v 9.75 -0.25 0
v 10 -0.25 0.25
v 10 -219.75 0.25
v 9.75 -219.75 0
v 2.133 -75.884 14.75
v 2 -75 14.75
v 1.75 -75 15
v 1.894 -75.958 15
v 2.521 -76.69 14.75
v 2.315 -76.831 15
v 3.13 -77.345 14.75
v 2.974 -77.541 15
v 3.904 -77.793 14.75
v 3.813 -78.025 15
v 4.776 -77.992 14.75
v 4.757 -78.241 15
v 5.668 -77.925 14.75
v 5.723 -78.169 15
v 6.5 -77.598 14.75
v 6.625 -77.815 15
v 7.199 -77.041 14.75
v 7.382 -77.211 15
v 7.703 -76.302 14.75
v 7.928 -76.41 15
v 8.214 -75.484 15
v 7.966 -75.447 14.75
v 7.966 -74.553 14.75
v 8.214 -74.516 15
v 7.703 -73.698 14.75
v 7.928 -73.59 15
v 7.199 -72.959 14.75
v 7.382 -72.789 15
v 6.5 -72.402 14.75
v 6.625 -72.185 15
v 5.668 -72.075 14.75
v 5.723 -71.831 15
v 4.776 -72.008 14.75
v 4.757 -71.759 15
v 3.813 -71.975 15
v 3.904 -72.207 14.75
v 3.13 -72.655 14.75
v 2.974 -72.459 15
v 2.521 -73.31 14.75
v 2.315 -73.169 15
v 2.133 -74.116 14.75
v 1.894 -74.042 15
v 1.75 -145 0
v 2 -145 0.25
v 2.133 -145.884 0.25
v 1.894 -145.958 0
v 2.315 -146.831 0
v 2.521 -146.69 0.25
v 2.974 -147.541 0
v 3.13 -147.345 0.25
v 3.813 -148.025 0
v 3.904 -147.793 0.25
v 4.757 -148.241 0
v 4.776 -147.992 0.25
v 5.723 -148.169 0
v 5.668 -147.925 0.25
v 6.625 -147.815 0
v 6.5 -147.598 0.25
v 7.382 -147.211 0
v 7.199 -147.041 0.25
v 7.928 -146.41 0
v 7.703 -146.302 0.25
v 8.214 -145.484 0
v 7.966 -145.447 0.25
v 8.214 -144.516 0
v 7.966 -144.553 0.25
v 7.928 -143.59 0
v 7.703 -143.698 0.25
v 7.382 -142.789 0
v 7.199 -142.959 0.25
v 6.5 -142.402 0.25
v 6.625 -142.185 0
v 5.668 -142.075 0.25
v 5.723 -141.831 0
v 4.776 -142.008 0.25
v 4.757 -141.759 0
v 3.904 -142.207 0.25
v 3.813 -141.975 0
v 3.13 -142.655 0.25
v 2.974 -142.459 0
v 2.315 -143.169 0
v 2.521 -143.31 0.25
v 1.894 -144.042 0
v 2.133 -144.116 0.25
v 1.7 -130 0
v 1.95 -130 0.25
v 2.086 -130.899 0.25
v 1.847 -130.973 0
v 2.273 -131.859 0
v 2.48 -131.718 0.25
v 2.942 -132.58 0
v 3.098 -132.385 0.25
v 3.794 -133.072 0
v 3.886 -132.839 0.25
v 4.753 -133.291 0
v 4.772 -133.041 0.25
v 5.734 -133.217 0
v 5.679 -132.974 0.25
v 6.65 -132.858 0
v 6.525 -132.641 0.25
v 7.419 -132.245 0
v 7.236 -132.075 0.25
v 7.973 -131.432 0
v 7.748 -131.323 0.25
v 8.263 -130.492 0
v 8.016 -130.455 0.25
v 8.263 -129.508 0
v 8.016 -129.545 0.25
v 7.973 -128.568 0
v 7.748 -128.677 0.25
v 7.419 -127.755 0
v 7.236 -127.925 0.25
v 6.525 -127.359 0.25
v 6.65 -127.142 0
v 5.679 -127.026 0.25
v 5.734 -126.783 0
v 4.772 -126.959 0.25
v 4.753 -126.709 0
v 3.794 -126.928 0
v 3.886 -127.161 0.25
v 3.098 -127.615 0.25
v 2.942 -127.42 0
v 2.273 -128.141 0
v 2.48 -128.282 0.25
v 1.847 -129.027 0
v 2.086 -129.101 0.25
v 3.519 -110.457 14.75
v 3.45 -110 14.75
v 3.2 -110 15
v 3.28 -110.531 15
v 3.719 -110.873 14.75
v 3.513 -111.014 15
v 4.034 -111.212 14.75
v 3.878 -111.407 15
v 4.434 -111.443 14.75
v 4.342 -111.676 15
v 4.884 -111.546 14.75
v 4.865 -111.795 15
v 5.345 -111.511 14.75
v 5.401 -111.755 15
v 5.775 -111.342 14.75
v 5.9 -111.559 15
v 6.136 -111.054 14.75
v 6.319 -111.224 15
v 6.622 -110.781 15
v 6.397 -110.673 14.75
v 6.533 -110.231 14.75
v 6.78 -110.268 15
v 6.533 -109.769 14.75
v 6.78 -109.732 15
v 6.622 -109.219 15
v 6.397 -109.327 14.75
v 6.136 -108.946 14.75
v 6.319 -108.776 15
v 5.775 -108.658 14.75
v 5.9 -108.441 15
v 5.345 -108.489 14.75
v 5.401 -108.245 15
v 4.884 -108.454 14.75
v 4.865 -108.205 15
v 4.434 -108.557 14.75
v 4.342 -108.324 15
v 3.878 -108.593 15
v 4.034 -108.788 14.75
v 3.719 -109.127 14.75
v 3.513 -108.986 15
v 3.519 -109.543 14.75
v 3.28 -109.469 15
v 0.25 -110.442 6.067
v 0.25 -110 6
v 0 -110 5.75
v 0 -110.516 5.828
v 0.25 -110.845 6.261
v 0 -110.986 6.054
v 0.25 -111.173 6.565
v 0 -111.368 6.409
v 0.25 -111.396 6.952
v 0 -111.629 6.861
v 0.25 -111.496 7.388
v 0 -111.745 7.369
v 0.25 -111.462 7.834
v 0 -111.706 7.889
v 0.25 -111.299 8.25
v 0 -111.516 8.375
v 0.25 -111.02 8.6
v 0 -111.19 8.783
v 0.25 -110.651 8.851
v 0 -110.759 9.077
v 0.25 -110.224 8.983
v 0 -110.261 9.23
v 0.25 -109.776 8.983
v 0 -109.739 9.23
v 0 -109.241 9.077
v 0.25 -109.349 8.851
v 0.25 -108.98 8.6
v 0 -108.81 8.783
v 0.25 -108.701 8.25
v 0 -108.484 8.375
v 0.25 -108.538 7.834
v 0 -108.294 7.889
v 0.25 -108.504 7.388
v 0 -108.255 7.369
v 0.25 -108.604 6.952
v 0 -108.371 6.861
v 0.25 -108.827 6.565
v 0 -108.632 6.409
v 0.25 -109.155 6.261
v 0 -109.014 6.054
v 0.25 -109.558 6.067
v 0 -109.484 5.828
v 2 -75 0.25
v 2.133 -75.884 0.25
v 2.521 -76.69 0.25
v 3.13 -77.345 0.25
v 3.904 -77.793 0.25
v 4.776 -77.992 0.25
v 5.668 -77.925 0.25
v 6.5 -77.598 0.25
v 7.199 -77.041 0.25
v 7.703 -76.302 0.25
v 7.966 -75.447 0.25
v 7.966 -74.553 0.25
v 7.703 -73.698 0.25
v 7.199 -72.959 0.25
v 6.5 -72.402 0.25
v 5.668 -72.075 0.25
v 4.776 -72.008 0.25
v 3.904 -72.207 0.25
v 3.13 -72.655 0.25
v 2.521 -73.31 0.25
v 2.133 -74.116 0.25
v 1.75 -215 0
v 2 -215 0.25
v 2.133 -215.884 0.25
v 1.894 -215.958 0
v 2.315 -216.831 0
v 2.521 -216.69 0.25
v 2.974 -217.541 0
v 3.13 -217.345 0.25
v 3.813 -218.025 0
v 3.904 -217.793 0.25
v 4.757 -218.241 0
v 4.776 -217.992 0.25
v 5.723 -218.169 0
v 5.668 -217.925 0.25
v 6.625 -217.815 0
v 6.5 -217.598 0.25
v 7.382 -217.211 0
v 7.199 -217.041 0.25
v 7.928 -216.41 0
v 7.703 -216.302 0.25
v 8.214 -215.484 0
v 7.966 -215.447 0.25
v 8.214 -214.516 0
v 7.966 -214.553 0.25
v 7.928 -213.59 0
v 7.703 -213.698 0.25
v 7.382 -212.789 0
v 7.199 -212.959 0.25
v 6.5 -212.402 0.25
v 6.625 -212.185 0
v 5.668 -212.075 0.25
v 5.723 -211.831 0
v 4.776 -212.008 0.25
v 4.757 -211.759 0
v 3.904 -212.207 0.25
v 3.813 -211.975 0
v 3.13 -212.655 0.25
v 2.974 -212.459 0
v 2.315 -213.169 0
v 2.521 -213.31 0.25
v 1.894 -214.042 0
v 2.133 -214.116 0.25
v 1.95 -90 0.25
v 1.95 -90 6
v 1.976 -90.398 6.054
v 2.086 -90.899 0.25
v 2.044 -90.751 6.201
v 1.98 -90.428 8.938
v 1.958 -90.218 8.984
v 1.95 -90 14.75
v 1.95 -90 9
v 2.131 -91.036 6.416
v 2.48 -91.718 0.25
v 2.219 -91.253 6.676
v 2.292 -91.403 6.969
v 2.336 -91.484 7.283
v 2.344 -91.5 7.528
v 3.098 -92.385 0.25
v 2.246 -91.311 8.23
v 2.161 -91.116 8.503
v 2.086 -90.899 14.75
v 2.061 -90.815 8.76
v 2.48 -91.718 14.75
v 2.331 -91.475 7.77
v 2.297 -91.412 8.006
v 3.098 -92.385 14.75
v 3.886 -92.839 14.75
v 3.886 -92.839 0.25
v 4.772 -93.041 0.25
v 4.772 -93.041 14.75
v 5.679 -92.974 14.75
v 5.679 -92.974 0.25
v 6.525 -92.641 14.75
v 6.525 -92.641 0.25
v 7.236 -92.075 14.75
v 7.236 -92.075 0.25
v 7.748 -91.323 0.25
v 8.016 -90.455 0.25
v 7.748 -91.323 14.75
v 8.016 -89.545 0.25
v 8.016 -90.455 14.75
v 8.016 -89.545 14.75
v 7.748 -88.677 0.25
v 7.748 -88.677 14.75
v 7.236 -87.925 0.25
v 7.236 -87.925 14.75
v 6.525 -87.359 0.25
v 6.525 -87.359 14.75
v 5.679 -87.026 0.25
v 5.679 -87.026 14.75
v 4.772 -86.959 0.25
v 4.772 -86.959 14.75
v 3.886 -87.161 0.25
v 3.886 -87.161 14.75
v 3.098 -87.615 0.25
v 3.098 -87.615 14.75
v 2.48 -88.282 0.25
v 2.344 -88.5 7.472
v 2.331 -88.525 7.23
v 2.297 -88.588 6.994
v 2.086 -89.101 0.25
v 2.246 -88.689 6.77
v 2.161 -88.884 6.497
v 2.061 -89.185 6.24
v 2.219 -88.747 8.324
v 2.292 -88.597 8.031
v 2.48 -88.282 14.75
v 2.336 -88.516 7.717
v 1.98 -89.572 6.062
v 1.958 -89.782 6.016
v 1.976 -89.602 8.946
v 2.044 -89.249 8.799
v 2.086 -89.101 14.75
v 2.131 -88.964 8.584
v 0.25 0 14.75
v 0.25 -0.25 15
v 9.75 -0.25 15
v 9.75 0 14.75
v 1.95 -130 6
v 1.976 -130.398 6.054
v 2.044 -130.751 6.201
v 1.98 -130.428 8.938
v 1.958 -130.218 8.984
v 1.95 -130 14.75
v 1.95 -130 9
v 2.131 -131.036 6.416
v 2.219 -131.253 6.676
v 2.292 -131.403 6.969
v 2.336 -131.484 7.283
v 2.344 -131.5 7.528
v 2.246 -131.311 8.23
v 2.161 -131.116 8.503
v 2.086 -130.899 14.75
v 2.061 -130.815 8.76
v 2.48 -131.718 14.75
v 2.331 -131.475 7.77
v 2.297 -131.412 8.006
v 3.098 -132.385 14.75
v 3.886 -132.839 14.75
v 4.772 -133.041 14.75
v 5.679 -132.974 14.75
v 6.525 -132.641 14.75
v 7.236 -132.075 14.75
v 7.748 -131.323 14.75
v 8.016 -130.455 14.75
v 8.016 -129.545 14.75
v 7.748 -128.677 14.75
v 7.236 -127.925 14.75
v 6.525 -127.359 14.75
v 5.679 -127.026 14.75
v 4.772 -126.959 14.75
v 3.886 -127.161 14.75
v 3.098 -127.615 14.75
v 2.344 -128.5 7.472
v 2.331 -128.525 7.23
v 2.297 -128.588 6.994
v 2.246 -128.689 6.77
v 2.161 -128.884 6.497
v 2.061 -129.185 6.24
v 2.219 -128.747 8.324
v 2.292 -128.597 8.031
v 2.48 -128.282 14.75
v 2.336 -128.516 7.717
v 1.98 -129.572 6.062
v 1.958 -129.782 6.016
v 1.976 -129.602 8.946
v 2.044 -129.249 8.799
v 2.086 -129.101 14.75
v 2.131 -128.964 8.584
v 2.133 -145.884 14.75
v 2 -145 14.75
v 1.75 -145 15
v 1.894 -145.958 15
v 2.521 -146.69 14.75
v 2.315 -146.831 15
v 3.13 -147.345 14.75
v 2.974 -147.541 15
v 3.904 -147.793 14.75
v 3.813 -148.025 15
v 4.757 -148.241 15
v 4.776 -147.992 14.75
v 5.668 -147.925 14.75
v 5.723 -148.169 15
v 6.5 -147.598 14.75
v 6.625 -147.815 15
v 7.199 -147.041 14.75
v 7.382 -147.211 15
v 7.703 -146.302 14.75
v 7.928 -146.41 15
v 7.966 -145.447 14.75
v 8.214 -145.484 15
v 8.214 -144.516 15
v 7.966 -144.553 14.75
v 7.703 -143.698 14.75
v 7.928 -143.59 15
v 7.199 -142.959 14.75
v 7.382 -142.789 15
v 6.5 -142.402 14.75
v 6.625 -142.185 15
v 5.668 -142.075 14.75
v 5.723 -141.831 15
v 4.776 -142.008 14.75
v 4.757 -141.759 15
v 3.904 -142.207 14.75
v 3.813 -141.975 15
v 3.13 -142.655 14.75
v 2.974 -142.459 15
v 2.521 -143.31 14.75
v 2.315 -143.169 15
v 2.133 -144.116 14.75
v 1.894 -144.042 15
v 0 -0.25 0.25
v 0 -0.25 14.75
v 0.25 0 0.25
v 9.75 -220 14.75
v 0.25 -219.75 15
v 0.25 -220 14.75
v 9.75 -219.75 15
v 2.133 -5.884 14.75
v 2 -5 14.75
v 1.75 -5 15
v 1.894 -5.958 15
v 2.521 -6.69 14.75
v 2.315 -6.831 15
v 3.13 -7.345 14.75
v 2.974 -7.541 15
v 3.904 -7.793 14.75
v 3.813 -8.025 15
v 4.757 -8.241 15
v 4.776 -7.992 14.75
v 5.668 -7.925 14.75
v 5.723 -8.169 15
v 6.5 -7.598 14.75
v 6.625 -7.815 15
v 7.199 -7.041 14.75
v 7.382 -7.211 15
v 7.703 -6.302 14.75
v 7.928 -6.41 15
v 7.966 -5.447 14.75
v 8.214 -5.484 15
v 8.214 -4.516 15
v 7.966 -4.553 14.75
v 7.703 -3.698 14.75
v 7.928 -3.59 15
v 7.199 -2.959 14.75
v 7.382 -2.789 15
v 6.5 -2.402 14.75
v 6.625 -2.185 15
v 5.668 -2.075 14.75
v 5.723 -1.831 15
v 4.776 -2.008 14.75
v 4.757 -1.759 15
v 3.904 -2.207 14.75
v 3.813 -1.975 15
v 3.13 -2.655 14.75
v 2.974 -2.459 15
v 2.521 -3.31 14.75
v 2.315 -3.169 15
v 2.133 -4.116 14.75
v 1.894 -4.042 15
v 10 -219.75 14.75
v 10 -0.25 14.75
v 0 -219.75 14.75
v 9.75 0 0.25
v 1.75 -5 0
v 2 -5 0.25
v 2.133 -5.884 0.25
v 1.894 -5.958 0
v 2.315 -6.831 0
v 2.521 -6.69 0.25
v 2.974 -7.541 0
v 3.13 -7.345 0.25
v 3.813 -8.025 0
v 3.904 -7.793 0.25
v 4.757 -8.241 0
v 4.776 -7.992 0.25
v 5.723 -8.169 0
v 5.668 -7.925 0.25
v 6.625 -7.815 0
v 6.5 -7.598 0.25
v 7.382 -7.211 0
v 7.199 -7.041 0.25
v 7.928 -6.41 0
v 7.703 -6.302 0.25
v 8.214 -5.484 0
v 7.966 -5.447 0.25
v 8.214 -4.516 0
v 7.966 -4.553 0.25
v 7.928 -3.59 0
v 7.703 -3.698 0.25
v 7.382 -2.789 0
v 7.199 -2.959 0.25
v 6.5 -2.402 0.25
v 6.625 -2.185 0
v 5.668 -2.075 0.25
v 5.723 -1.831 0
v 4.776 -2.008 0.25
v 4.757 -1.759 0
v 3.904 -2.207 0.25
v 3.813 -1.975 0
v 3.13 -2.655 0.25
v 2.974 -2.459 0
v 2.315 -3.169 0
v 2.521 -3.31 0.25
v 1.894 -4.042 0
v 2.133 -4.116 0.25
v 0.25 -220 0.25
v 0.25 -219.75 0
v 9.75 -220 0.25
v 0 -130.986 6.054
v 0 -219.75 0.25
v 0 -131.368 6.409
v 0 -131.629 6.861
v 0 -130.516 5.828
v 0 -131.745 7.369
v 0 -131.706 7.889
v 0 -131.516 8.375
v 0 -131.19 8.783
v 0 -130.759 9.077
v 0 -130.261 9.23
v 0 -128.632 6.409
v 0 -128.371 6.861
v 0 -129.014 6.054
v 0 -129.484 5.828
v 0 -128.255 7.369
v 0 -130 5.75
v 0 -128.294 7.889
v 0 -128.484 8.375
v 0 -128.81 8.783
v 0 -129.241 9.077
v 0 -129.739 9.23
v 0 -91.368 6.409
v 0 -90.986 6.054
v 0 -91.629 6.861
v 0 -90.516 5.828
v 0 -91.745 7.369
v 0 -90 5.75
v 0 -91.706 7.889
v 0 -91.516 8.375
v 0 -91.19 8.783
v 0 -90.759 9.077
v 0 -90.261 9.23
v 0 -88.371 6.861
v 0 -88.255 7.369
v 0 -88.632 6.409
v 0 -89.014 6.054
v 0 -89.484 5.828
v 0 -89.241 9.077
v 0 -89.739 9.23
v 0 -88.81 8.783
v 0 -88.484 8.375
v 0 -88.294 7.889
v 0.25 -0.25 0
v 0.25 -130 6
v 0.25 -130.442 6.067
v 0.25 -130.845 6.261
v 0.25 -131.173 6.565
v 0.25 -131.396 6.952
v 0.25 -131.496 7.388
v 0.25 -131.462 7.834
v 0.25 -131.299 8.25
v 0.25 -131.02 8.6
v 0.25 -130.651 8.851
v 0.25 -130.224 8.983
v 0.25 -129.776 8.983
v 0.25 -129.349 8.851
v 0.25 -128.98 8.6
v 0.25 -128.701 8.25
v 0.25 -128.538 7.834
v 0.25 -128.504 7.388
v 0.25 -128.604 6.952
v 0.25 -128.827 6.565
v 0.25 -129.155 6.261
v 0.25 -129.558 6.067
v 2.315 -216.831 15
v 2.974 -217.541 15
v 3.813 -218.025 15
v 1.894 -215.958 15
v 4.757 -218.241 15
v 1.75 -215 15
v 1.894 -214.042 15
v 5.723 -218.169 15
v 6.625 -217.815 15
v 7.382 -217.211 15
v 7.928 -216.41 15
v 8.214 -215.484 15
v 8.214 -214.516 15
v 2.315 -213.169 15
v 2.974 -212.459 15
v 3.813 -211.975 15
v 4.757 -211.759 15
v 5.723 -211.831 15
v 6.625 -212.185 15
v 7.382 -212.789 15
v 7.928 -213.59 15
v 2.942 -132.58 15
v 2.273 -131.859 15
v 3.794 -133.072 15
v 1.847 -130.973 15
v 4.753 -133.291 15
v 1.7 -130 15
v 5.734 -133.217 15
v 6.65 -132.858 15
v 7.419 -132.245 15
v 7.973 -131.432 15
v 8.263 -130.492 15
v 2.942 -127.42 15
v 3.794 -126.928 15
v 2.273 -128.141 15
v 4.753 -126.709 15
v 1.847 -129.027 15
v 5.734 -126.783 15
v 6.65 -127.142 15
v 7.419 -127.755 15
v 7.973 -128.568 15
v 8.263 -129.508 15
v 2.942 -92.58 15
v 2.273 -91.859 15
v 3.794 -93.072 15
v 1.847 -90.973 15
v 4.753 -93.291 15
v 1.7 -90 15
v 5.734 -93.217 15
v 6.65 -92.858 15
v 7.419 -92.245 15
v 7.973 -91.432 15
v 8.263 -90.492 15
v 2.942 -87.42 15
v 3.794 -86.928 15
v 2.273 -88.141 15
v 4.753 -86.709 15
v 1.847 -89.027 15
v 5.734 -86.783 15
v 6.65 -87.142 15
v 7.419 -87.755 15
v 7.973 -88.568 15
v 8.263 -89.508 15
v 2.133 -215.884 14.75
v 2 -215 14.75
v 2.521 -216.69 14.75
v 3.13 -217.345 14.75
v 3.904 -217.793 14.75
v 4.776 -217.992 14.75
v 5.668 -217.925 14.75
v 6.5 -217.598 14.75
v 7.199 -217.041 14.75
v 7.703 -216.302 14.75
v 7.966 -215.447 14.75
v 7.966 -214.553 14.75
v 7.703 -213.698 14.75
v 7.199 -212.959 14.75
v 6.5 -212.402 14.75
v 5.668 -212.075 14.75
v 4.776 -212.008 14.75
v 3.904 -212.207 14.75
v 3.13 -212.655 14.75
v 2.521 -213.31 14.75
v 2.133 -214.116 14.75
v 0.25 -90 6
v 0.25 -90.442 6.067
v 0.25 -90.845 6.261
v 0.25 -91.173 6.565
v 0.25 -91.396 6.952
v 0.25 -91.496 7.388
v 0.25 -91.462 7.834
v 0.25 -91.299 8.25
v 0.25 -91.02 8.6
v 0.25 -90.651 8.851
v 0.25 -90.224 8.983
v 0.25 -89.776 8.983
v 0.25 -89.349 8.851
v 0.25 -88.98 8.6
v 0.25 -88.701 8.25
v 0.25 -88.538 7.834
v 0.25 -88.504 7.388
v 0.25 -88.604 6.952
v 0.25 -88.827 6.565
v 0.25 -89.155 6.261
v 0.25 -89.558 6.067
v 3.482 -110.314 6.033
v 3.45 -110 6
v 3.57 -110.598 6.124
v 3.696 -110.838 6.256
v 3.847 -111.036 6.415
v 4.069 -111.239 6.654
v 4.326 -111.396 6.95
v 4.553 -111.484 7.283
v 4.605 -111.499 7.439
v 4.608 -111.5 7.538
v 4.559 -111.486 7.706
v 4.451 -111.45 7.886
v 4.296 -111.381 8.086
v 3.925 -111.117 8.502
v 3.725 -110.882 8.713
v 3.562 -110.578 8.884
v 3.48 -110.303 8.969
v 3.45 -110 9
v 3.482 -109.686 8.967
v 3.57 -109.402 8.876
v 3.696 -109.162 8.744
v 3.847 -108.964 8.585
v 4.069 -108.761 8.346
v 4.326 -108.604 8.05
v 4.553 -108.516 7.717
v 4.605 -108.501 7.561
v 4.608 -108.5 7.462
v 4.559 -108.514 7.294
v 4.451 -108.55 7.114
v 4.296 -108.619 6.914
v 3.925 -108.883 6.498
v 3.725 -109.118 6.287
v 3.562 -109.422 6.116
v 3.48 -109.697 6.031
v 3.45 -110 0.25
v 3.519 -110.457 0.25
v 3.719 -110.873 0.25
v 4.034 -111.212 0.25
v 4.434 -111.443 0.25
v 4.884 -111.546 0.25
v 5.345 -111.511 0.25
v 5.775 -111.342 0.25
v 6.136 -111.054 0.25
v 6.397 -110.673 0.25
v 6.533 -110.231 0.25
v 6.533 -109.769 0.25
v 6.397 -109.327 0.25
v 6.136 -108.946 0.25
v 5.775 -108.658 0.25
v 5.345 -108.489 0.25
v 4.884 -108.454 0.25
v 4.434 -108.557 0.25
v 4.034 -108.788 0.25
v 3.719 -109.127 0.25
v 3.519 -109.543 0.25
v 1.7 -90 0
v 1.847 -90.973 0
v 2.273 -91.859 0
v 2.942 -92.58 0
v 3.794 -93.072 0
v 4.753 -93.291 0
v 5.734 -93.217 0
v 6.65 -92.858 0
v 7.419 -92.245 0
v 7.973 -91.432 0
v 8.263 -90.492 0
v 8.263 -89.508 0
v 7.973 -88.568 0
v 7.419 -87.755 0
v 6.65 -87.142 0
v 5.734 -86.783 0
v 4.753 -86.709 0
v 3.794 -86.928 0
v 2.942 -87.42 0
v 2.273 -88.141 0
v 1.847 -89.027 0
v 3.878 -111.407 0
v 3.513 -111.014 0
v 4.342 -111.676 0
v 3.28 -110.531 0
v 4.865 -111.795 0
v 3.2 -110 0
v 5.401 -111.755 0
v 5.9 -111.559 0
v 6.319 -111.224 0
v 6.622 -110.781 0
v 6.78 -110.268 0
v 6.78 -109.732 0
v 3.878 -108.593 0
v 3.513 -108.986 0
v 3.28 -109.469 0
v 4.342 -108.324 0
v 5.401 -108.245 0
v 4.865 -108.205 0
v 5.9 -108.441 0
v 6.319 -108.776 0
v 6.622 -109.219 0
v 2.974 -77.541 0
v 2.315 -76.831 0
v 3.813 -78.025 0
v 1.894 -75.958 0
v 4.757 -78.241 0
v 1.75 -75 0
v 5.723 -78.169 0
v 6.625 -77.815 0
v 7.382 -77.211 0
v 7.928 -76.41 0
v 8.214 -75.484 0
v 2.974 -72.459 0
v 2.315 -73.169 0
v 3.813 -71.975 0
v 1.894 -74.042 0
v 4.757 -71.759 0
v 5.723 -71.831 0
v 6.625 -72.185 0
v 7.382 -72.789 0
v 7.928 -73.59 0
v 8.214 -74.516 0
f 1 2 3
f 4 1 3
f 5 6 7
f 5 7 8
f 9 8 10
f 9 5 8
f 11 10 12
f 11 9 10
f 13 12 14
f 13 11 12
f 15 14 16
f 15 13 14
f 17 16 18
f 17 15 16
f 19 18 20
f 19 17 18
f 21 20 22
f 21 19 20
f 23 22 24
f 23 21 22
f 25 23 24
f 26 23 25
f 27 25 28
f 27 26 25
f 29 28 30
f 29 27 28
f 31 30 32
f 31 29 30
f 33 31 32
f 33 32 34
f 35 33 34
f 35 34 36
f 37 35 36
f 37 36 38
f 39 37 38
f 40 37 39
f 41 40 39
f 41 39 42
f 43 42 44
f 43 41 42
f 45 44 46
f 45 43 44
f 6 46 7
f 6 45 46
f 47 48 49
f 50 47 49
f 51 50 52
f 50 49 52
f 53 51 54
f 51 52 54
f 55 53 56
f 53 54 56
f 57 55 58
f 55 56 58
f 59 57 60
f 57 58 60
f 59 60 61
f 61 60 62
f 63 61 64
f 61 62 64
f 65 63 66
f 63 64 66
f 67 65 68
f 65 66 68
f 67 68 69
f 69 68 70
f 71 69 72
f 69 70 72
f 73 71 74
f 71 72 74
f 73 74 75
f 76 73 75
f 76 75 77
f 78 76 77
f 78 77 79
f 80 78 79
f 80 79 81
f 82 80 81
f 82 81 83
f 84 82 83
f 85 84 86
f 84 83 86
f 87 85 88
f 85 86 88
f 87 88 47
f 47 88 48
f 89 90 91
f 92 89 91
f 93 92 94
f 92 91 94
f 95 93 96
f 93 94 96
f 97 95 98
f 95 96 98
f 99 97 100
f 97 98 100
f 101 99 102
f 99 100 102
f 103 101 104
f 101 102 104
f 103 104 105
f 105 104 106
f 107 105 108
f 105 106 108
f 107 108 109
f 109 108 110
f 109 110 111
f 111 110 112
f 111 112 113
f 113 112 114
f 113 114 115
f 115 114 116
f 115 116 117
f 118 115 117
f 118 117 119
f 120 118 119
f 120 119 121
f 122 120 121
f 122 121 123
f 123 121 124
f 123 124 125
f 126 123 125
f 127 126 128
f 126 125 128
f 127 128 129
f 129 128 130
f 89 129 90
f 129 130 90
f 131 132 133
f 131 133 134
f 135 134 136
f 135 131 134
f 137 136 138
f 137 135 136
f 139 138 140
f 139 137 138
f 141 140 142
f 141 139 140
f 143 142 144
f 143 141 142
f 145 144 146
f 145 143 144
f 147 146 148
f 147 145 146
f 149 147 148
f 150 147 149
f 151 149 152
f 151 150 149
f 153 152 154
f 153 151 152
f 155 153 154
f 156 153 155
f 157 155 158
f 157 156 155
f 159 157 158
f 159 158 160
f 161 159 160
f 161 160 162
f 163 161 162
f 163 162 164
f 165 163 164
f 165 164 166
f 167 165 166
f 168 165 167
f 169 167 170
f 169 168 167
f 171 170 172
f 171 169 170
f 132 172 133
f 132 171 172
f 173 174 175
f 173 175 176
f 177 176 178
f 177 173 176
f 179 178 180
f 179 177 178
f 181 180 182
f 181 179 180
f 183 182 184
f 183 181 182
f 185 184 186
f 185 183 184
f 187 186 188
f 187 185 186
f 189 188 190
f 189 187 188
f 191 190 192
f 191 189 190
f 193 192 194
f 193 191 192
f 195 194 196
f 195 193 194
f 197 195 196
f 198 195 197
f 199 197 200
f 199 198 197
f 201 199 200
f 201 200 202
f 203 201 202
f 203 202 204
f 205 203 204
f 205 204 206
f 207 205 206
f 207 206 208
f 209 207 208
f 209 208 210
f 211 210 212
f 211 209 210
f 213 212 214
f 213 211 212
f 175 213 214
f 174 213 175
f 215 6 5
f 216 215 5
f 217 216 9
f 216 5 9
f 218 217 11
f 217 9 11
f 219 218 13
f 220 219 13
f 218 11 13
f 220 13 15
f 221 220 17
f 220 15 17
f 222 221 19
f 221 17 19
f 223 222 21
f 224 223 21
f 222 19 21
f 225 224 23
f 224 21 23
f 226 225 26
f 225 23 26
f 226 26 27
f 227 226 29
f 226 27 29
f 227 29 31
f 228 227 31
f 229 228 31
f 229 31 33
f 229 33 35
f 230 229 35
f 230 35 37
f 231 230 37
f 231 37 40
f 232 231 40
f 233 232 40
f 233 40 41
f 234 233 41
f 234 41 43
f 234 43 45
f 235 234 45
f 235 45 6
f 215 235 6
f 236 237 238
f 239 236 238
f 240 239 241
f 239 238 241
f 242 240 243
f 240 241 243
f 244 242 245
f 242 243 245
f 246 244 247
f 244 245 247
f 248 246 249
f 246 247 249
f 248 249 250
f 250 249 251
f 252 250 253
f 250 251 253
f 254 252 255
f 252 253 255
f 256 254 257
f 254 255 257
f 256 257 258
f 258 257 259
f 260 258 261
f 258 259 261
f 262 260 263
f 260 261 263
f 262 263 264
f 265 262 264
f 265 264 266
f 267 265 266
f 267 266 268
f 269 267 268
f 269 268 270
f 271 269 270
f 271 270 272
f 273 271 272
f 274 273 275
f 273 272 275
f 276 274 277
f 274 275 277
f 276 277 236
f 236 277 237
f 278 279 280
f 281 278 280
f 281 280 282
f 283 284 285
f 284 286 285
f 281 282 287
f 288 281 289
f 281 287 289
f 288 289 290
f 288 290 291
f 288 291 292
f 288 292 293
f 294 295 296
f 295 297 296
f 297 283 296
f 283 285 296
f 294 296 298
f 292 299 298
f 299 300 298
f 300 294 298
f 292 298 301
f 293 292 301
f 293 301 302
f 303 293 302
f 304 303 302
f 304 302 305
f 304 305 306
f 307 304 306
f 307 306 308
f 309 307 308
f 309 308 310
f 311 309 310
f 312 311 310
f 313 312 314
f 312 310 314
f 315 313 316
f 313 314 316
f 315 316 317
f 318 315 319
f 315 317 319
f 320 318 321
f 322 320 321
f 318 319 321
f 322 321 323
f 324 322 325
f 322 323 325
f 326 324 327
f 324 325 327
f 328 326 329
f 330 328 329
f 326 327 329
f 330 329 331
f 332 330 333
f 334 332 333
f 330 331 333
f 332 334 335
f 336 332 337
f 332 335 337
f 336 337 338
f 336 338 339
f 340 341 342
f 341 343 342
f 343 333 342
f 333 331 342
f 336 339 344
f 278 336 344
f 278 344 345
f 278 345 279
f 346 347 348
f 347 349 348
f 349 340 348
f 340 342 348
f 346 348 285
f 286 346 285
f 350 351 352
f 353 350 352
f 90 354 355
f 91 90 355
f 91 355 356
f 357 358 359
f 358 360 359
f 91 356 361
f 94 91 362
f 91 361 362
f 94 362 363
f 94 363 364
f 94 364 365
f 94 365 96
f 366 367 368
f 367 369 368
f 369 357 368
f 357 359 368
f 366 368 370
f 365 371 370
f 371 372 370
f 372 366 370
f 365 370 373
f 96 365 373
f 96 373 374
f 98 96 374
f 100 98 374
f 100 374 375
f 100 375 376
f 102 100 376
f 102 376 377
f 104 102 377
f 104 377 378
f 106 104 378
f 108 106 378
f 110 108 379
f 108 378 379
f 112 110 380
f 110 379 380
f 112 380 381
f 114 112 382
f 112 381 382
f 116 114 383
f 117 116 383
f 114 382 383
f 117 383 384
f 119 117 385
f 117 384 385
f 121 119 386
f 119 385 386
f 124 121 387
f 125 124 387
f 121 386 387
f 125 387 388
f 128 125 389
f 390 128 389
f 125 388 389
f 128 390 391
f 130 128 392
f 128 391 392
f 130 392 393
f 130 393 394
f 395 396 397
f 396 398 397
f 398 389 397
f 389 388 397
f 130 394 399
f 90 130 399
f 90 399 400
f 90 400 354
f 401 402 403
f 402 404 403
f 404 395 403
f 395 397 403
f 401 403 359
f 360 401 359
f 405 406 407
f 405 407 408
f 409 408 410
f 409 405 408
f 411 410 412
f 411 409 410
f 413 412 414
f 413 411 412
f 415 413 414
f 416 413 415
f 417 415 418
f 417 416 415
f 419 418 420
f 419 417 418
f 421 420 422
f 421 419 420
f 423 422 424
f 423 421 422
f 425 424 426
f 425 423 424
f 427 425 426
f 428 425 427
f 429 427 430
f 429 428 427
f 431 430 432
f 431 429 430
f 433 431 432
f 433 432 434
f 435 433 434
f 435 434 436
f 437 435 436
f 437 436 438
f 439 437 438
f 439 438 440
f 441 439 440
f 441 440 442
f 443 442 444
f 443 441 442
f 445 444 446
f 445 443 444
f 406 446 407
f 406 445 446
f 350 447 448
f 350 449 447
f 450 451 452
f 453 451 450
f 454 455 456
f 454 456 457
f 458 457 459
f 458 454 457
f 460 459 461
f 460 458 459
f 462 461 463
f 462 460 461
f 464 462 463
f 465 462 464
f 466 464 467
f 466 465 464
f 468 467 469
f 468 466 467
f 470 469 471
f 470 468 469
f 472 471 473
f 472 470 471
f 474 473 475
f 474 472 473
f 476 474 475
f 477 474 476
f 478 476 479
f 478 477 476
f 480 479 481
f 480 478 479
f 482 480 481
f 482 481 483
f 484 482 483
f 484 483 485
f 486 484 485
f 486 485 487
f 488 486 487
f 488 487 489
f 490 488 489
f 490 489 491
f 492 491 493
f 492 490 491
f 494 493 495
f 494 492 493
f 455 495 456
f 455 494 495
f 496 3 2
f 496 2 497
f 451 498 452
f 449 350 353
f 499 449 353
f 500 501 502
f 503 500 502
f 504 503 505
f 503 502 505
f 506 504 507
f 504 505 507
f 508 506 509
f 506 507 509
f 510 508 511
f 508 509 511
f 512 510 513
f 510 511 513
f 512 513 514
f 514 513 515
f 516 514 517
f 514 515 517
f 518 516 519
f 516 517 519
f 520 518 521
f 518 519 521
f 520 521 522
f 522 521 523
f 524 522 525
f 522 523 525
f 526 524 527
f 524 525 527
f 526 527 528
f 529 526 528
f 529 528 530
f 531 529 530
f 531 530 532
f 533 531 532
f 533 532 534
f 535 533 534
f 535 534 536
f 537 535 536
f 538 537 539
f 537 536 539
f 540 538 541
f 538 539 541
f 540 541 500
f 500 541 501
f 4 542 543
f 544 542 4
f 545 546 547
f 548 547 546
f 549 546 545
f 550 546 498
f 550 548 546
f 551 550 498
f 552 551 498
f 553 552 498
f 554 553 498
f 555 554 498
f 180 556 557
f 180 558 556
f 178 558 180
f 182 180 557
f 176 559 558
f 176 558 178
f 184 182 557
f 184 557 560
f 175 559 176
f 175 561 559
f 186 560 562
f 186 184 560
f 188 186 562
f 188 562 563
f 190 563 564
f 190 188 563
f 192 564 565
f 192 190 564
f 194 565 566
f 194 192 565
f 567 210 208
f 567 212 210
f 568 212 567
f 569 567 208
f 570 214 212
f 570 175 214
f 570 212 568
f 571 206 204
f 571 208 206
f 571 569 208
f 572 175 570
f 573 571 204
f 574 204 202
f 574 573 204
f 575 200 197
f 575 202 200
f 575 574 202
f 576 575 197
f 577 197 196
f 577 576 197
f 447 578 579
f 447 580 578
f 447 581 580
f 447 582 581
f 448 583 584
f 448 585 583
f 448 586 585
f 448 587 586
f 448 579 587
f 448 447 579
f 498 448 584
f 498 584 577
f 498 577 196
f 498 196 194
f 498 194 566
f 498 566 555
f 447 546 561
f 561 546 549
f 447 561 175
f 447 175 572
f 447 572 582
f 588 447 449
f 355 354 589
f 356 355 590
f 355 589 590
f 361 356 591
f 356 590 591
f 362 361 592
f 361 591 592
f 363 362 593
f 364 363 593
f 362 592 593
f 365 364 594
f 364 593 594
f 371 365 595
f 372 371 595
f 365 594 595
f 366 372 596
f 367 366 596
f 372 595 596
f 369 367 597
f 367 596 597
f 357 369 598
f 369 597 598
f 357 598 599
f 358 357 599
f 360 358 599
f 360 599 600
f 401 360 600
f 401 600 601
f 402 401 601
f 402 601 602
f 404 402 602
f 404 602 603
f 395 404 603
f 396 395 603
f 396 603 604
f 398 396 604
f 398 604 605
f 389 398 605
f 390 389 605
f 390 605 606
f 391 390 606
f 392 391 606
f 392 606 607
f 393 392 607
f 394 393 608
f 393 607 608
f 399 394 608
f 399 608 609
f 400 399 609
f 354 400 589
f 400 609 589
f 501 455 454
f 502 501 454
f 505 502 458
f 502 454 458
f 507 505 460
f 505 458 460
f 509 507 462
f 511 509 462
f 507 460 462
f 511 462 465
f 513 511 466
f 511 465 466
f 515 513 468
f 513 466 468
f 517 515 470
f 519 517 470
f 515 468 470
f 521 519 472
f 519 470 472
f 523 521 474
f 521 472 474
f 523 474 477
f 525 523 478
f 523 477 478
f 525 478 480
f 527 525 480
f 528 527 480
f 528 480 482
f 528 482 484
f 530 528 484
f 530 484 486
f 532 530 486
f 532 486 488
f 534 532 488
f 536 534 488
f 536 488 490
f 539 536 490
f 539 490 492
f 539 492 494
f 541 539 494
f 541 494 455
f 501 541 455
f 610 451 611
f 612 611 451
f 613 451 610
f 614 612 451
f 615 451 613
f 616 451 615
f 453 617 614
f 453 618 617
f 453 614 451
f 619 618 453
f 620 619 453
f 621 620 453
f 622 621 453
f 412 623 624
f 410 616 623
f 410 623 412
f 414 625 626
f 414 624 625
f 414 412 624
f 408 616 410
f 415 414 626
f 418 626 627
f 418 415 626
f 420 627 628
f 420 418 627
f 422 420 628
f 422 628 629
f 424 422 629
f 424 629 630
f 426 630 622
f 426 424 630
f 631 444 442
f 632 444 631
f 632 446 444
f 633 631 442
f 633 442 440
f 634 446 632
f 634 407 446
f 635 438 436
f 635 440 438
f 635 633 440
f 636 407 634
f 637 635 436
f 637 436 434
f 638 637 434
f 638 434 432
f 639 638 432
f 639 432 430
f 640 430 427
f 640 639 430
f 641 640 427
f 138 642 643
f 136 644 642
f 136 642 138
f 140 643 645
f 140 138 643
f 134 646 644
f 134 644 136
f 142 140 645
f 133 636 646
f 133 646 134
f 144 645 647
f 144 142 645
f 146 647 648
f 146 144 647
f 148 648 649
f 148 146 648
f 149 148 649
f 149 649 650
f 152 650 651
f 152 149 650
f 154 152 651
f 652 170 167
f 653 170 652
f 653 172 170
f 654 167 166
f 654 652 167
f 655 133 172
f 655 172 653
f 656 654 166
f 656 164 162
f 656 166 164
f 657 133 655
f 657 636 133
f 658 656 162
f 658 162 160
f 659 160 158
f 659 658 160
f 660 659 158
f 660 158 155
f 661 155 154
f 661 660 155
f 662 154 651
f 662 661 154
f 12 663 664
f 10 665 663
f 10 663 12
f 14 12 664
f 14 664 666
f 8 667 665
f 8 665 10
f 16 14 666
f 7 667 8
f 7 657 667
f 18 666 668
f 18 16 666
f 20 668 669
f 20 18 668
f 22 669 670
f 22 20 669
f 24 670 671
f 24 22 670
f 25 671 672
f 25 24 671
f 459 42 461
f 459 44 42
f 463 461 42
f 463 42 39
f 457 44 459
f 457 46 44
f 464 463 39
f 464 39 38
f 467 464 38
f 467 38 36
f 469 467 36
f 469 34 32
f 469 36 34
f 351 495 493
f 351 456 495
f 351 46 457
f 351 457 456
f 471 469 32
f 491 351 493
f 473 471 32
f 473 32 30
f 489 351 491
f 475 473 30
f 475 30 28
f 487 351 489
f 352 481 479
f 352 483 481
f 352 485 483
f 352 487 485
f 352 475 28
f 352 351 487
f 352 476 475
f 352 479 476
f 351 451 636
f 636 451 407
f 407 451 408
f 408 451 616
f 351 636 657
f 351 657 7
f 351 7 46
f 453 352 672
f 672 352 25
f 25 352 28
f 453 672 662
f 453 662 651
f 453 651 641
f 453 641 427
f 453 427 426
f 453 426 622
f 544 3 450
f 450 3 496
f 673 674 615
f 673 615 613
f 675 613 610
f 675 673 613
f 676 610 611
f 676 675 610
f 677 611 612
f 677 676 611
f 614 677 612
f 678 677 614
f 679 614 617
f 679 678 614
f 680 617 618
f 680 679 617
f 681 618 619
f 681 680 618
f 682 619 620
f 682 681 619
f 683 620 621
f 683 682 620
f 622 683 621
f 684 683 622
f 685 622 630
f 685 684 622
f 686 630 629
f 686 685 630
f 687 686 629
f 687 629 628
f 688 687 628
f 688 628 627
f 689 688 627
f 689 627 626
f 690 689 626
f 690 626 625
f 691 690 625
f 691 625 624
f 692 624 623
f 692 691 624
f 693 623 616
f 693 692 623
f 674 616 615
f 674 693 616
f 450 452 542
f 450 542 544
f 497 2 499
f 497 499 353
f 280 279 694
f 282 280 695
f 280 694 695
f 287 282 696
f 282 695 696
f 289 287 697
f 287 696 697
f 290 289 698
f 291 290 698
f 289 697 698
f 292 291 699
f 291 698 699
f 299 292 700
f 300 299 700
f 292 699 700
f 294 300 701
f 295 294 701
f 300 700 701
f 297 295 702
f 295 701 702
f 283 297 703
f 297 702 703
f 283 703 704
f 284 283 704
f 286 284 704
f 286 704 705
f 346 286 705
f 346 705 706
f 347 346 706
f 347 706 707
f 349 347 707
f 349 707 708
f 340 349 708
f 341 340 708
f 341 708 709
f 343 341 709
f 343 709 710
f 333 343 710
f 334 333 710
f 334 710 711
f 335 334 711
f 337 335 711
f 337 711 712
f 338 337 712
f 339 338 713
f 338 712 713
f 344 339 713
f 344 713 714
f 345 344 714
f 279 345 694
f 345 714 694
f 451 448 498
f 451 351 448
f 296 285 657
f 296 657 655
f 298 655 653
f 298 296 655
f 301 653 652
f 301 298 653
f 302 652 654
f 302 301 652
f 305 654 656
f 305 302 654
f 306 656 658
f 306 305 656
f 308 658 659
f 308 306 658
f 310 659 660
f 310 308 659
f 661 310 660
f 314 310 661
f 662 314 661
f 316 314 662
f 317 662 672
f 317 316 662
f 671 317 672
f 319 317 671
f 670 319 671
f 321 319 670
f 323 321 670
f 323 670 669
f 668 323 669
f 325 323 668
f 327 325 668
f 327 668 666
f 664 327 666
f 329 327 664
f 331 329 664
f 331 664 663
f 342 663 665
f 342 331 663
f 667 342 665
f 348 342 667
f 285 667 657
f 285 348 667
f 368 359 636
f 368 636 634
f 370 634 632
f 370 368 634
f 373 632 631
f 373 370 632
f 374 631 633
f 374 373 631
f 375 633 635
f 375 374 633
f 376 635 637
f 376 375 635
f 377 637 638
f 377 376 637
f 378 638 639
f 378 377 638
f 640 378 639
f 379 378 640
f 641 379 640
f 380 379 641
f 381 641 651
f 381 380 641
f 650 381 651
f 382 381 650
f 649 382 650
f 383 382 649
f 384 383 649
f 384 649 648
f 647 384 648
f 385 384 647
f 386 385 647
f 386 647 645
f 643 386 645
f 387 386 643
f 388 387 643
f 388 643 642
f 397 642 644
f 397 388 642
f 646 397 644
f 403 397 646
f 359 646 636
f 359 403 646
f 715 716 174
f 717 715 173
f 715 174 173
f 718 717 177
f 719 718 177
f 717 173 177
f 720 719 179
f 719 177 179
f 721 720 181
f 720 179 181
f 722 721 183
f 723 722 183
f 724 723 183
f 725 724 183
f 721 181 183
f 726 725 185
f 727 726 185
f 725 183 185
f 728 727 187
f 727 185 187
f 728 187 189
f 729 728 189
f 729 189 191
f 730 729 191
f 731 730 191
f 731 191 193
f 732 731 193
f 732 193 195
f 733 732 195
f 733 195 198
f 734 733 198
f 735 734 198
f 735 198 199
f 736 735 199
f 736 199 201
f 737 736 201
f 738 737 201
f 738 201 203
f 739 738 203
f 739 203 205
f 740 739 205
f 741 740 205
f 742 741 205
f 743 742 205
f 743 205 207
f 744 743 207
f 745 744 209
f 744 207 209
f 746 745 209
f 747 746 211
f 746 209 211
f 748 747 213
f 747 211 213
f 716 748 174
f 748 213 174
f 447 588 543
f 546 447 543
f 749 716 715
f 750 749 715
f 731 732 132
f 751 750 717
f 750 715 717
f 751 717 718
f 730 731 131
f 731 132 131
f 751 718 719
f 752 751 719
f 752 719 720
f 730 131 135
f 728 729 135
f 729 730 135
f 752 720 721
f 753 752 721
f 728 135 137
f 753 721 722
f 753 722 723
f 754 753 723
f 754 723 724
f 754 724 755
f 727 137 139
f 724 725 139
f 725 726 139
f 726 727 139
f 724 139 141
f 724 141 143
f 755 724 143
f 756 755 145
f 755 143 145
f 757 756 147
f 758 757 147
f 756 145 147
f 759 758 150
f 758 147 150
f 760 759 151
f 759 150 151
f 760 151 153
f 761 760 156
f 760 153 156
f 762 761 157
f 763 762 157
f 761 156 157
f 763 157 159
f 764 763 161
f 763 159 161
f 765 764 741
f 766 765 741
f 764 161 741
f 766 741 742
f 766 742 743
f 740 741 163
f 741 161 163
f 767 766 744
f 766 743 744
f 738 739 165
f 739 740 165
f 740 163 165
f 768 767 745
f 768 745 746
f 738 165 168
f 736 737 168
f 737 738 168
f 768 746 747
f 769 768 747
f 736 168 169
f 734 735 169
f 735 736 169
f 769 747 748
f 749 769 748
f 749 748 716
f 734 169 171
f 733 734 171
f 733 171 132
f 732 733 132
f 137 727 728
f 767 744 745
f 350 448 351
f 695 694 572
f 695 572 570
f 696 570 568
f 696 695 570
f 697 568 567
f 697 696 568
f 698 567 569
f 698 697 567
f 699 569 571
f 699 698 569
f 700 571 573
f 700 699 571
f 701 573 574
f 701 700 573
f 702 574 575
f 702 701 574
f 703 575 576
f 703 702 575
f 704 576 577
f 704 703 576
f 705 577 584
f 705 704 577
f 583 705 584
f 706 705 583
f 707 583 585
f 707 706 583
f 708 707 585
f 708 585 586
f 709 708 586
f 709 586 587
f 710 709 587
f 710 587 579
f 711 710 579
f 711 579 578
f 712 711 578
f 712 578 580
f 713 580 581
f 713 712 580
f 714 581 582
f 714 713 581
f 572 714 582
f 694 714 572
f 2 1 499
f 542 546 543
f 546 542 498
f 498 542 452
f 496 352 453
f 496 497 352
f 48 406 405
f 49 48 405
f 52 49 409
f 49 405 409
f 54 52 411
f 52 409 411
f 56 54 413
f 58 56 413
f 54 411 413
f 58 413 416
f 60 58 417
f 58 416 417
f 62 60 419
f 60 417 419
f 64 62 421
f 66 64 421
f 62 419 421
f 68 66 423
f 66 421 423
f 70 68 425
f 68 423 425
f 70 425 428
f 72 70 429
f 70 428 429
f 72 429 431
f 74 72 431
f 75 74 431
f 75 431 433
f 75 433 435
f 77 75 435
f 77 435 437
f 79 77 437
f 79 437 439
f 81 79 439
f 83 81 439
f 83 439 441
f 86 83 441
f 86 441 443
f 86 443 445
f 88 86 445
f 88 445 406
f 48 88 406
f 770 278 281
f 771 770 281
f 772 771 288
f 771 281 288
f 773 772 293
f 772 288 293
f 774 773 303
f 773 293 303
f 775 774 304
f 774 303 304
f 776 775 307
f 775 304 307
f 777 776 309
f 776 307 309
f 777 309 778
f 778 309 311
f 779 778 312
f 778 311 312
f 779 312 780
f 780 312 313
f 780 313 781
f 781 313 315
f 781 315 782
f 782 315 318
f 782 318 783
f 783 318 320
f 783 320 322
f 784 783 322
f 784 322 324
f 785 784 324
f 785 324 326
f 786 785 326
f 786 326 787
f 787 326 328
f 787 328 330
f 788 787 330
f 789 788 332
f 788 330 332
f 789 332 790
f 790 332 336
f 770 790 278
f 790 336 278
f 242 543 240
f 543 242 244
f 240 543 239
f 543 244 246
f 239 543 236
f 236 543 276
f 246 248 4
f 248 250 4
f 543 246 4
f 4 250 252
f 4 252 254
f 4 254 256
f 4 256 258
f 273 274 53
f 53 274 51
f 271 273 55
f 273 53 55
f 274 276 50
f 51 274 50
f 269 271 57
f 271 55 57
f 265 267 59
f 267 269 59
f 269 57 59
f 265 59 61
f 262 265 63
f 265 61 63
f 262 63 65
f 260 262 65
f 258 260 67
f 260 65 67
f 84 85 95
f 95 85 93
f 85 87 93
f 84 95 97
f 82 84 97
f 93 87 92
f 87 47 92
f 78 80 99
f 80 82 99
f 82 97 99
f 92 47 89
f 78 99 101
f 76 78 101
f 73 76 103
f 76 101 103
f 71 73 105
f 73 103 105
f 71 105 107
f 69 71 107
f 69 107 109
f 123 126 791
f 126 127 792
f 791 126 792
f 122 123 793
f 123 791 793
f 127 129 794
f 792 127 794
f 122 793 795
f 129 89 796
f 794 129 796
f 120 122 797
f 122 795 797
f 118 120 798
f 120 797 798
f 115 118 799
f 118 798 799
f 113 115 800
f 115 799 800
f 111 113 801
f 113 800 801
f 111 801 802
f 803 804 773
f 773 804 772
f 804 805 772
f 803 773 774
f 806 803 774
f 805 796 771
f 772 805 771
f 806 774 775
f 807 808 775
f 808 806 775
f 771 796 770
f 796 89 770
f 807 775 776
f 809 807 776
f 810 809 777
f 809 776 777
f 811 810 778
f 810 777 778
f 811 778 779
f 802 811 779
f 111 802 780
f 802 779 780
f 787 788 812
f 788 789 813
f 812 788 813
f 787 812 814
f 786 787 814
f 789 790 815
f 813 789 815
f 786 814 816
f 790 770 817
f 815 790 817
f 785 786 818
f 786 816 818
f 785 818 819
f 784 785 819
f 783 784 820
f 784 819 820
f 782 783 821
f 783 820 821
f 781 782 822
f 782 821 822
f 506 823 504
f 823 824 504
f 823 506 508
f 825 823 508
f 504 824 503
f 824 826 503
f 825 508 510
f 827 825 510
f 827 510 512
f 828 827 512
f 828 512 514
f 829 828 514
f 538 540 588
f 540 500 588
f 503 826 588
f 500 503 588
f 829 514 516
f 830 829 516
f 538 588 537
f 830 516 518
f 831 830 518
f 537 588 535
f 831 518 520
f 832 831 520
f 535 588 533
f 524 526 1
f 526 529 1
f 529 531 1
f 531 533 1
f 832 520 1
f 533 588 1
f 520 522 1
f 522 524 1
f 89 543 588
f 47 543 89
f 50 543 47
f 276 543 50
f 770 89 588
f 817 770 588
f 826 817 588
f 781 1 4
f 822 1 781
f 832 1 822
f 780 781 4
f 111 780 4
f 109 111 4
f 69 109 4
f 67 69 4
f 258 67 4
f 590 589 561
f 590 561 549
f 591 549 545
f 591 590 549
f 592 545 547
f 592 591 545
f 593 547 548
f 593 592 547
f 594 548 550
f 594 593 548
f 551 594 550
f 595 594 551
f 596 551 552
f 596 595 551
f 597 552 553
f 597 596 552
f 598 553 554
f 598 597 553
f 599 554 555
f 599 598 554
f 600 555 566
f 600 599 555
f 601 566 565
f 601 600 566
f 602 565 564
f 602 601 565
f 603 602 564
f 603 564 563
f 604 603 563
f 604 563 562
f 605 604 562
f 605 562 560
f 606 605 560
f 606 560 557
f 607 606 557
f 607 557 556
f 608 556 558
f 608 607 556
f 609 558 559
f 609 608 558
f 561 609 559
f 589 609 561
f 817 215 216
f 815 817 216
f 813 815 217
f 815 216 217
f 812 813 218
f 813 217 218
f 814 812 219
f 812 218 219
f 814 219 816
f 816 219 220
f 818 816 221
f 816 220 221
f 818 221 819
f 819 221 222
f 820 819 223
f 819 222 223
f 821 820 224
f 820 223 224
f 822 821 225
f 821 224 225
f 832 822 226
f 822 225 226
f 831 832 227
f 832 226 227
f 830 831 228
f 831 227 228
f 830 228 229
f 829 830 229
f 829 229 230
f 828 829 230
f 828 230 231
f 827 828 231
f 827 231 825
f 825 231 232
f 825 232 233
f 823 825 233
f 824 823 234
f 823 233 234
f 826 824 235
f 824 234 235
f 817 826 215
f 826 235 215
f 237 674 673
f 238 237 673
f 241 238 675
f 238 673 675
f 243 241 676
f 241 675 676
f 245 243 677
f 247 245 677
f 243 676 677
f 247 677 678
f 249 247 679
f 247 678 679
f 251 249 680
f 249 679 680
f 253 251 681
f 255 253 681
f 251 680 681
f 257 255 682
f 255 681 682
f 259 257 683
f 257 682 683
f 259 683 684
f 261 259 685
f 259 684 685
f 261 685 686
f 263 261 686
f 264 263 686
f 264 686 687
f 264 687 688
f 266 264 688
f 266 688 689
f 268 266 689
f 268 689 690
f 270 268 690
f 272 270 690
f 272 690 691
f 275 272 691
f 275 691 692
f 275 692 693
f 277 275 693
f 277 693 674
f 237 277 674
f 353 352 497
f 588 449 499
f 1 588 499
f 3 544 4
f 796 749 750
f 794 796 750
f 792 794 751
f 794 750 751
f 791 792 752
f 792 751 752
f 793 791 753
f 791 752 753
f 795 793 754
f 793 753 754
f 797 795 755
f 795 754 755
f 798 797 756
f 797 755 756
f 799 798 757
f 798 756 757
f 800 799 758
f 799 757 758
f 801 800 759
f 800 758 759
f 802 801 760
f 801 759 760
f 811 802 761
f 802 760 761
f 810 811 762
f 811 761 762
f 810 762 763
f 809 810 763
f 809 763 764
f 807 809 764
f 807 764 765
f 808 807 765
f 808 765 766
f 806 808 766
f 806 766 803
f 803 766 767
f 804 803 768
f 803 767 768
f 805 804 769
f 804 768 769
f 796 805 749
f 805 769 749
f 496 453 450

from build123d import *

# Parameters (mm, degrees)
SKETCH_W        = 10
SKETCH_H        = 15
PAD_DEPTH       = 220
SKETCH001_R     = 3
POCKET_DEPTH    = 15.001
SKETCH002_R     = 3.05
SKETCH002_R_2   = 1.55
POCKET001_DEPTH = 15.001
SKETCH003_R     = 1.5
POCKET002_DEPTH = 5
CHAMFER_SIZE    = 0.25


with BuildPart() as part:
    # Sketch → Pad (new body)
    with BuildSketch(Plane.XZ):
        with Locations((5, 7.5)):
            Rectangle(SKETCH_W, SKETCH_H)
    extrude(amount=PAD_DEPTH)

    # Sketch001 (on Face3 of Pad) → Pocket (cut, through all)
    with BuildSketch(Plane(origin=(0, 0, 15), x_dir=(-1, 0, 0), z_dir=(0, 0, 1))):
        with Locations((-5, 215)):
            Circle(SKETCH001_R)
        with Locations((-5, 145)):
            Circle(SKETCH001_R)
        with Locations((-5, 75)):
            Circle(SKETCH001_R)
        with Locations((-5, 5)):
            Circle(SKETCH001_R)
    extrude(amount=-POCKET_DEPTH, mode=Mode.SUBTRACT)

    # Sketch002 (on Face10 of Pocket) → Pocket001 (cut, through all)
    with BuildSketch(Plane(origin=(0, 0, 15), x_dir=(-1, 0, 0), z_dir=(0, 0, 1))):
        with Locations((-5, 130)):
            Circle(SKETCH002_R)
        with Locations((-5, 110)):
            Circle(SKETCH002_R_2)
        with Locations((-5, 90)):
            Circle(SKETCH002_R)
    extrude(amount=-POCKET001_DEPTH, mode=Mode.SUBTRACT)

    # Sketch003 (on Face2 of Pocket001) → Pocket002 (cut)
    with BuildSketch(Plane(origin=(0, 0, 0), x_dir=(0, 0, -1), z_dir=(-1, 0, 0))):
        with Locations((-7.5, 130)):
            Circle(SKETCH003_R)
        with Locations((-7.5, 110)):
            Circle(SKETCH003_R)
        with Locations((-7.5, 90)):
            Circle(SKETCH003_R)
    extrude(amount=-POCKET002_DEPTH, mode=Mode.SUBTRACT)

    # Chamfer
    chamfer_edges = [part.edges().sort_by_distance(p)[0] for p in [
        (0, -110, 15),
        (0, 0, 7.5),
        (0, -220, 7.5),
        (0, -110, 0),
        (0, -130, 9),
        (0, -110, 9),
        (0, -90, 9),
        (10, -110, 15),
        (5, 0, 15),
        (5, -220, 15),
        (8.05, -130, 15),
        (6.55, -110, 15),
        (8.05, -90, 15),
        (8, -75, 15),
        (8, -5, 15),
        (8, -215, 15),
        (8, -145, 15),
        (5, -220, 0),
        (10, -220, 7.5),
        (5, 0, 0),
        (10, -110, 0),
        (8.05, -130, 0),
        (6.55, -110, 0),
        (8.05, -90, 0),
        (8, -75, 0),
        (8, -5, 0),
        (8, -215, 0),
        (8, -145, 0),
        (10, 0, 7.5),
    ]]
    chamfer(chamfer_edges, length=CHAMFER_SIZE)


solid = part.part
